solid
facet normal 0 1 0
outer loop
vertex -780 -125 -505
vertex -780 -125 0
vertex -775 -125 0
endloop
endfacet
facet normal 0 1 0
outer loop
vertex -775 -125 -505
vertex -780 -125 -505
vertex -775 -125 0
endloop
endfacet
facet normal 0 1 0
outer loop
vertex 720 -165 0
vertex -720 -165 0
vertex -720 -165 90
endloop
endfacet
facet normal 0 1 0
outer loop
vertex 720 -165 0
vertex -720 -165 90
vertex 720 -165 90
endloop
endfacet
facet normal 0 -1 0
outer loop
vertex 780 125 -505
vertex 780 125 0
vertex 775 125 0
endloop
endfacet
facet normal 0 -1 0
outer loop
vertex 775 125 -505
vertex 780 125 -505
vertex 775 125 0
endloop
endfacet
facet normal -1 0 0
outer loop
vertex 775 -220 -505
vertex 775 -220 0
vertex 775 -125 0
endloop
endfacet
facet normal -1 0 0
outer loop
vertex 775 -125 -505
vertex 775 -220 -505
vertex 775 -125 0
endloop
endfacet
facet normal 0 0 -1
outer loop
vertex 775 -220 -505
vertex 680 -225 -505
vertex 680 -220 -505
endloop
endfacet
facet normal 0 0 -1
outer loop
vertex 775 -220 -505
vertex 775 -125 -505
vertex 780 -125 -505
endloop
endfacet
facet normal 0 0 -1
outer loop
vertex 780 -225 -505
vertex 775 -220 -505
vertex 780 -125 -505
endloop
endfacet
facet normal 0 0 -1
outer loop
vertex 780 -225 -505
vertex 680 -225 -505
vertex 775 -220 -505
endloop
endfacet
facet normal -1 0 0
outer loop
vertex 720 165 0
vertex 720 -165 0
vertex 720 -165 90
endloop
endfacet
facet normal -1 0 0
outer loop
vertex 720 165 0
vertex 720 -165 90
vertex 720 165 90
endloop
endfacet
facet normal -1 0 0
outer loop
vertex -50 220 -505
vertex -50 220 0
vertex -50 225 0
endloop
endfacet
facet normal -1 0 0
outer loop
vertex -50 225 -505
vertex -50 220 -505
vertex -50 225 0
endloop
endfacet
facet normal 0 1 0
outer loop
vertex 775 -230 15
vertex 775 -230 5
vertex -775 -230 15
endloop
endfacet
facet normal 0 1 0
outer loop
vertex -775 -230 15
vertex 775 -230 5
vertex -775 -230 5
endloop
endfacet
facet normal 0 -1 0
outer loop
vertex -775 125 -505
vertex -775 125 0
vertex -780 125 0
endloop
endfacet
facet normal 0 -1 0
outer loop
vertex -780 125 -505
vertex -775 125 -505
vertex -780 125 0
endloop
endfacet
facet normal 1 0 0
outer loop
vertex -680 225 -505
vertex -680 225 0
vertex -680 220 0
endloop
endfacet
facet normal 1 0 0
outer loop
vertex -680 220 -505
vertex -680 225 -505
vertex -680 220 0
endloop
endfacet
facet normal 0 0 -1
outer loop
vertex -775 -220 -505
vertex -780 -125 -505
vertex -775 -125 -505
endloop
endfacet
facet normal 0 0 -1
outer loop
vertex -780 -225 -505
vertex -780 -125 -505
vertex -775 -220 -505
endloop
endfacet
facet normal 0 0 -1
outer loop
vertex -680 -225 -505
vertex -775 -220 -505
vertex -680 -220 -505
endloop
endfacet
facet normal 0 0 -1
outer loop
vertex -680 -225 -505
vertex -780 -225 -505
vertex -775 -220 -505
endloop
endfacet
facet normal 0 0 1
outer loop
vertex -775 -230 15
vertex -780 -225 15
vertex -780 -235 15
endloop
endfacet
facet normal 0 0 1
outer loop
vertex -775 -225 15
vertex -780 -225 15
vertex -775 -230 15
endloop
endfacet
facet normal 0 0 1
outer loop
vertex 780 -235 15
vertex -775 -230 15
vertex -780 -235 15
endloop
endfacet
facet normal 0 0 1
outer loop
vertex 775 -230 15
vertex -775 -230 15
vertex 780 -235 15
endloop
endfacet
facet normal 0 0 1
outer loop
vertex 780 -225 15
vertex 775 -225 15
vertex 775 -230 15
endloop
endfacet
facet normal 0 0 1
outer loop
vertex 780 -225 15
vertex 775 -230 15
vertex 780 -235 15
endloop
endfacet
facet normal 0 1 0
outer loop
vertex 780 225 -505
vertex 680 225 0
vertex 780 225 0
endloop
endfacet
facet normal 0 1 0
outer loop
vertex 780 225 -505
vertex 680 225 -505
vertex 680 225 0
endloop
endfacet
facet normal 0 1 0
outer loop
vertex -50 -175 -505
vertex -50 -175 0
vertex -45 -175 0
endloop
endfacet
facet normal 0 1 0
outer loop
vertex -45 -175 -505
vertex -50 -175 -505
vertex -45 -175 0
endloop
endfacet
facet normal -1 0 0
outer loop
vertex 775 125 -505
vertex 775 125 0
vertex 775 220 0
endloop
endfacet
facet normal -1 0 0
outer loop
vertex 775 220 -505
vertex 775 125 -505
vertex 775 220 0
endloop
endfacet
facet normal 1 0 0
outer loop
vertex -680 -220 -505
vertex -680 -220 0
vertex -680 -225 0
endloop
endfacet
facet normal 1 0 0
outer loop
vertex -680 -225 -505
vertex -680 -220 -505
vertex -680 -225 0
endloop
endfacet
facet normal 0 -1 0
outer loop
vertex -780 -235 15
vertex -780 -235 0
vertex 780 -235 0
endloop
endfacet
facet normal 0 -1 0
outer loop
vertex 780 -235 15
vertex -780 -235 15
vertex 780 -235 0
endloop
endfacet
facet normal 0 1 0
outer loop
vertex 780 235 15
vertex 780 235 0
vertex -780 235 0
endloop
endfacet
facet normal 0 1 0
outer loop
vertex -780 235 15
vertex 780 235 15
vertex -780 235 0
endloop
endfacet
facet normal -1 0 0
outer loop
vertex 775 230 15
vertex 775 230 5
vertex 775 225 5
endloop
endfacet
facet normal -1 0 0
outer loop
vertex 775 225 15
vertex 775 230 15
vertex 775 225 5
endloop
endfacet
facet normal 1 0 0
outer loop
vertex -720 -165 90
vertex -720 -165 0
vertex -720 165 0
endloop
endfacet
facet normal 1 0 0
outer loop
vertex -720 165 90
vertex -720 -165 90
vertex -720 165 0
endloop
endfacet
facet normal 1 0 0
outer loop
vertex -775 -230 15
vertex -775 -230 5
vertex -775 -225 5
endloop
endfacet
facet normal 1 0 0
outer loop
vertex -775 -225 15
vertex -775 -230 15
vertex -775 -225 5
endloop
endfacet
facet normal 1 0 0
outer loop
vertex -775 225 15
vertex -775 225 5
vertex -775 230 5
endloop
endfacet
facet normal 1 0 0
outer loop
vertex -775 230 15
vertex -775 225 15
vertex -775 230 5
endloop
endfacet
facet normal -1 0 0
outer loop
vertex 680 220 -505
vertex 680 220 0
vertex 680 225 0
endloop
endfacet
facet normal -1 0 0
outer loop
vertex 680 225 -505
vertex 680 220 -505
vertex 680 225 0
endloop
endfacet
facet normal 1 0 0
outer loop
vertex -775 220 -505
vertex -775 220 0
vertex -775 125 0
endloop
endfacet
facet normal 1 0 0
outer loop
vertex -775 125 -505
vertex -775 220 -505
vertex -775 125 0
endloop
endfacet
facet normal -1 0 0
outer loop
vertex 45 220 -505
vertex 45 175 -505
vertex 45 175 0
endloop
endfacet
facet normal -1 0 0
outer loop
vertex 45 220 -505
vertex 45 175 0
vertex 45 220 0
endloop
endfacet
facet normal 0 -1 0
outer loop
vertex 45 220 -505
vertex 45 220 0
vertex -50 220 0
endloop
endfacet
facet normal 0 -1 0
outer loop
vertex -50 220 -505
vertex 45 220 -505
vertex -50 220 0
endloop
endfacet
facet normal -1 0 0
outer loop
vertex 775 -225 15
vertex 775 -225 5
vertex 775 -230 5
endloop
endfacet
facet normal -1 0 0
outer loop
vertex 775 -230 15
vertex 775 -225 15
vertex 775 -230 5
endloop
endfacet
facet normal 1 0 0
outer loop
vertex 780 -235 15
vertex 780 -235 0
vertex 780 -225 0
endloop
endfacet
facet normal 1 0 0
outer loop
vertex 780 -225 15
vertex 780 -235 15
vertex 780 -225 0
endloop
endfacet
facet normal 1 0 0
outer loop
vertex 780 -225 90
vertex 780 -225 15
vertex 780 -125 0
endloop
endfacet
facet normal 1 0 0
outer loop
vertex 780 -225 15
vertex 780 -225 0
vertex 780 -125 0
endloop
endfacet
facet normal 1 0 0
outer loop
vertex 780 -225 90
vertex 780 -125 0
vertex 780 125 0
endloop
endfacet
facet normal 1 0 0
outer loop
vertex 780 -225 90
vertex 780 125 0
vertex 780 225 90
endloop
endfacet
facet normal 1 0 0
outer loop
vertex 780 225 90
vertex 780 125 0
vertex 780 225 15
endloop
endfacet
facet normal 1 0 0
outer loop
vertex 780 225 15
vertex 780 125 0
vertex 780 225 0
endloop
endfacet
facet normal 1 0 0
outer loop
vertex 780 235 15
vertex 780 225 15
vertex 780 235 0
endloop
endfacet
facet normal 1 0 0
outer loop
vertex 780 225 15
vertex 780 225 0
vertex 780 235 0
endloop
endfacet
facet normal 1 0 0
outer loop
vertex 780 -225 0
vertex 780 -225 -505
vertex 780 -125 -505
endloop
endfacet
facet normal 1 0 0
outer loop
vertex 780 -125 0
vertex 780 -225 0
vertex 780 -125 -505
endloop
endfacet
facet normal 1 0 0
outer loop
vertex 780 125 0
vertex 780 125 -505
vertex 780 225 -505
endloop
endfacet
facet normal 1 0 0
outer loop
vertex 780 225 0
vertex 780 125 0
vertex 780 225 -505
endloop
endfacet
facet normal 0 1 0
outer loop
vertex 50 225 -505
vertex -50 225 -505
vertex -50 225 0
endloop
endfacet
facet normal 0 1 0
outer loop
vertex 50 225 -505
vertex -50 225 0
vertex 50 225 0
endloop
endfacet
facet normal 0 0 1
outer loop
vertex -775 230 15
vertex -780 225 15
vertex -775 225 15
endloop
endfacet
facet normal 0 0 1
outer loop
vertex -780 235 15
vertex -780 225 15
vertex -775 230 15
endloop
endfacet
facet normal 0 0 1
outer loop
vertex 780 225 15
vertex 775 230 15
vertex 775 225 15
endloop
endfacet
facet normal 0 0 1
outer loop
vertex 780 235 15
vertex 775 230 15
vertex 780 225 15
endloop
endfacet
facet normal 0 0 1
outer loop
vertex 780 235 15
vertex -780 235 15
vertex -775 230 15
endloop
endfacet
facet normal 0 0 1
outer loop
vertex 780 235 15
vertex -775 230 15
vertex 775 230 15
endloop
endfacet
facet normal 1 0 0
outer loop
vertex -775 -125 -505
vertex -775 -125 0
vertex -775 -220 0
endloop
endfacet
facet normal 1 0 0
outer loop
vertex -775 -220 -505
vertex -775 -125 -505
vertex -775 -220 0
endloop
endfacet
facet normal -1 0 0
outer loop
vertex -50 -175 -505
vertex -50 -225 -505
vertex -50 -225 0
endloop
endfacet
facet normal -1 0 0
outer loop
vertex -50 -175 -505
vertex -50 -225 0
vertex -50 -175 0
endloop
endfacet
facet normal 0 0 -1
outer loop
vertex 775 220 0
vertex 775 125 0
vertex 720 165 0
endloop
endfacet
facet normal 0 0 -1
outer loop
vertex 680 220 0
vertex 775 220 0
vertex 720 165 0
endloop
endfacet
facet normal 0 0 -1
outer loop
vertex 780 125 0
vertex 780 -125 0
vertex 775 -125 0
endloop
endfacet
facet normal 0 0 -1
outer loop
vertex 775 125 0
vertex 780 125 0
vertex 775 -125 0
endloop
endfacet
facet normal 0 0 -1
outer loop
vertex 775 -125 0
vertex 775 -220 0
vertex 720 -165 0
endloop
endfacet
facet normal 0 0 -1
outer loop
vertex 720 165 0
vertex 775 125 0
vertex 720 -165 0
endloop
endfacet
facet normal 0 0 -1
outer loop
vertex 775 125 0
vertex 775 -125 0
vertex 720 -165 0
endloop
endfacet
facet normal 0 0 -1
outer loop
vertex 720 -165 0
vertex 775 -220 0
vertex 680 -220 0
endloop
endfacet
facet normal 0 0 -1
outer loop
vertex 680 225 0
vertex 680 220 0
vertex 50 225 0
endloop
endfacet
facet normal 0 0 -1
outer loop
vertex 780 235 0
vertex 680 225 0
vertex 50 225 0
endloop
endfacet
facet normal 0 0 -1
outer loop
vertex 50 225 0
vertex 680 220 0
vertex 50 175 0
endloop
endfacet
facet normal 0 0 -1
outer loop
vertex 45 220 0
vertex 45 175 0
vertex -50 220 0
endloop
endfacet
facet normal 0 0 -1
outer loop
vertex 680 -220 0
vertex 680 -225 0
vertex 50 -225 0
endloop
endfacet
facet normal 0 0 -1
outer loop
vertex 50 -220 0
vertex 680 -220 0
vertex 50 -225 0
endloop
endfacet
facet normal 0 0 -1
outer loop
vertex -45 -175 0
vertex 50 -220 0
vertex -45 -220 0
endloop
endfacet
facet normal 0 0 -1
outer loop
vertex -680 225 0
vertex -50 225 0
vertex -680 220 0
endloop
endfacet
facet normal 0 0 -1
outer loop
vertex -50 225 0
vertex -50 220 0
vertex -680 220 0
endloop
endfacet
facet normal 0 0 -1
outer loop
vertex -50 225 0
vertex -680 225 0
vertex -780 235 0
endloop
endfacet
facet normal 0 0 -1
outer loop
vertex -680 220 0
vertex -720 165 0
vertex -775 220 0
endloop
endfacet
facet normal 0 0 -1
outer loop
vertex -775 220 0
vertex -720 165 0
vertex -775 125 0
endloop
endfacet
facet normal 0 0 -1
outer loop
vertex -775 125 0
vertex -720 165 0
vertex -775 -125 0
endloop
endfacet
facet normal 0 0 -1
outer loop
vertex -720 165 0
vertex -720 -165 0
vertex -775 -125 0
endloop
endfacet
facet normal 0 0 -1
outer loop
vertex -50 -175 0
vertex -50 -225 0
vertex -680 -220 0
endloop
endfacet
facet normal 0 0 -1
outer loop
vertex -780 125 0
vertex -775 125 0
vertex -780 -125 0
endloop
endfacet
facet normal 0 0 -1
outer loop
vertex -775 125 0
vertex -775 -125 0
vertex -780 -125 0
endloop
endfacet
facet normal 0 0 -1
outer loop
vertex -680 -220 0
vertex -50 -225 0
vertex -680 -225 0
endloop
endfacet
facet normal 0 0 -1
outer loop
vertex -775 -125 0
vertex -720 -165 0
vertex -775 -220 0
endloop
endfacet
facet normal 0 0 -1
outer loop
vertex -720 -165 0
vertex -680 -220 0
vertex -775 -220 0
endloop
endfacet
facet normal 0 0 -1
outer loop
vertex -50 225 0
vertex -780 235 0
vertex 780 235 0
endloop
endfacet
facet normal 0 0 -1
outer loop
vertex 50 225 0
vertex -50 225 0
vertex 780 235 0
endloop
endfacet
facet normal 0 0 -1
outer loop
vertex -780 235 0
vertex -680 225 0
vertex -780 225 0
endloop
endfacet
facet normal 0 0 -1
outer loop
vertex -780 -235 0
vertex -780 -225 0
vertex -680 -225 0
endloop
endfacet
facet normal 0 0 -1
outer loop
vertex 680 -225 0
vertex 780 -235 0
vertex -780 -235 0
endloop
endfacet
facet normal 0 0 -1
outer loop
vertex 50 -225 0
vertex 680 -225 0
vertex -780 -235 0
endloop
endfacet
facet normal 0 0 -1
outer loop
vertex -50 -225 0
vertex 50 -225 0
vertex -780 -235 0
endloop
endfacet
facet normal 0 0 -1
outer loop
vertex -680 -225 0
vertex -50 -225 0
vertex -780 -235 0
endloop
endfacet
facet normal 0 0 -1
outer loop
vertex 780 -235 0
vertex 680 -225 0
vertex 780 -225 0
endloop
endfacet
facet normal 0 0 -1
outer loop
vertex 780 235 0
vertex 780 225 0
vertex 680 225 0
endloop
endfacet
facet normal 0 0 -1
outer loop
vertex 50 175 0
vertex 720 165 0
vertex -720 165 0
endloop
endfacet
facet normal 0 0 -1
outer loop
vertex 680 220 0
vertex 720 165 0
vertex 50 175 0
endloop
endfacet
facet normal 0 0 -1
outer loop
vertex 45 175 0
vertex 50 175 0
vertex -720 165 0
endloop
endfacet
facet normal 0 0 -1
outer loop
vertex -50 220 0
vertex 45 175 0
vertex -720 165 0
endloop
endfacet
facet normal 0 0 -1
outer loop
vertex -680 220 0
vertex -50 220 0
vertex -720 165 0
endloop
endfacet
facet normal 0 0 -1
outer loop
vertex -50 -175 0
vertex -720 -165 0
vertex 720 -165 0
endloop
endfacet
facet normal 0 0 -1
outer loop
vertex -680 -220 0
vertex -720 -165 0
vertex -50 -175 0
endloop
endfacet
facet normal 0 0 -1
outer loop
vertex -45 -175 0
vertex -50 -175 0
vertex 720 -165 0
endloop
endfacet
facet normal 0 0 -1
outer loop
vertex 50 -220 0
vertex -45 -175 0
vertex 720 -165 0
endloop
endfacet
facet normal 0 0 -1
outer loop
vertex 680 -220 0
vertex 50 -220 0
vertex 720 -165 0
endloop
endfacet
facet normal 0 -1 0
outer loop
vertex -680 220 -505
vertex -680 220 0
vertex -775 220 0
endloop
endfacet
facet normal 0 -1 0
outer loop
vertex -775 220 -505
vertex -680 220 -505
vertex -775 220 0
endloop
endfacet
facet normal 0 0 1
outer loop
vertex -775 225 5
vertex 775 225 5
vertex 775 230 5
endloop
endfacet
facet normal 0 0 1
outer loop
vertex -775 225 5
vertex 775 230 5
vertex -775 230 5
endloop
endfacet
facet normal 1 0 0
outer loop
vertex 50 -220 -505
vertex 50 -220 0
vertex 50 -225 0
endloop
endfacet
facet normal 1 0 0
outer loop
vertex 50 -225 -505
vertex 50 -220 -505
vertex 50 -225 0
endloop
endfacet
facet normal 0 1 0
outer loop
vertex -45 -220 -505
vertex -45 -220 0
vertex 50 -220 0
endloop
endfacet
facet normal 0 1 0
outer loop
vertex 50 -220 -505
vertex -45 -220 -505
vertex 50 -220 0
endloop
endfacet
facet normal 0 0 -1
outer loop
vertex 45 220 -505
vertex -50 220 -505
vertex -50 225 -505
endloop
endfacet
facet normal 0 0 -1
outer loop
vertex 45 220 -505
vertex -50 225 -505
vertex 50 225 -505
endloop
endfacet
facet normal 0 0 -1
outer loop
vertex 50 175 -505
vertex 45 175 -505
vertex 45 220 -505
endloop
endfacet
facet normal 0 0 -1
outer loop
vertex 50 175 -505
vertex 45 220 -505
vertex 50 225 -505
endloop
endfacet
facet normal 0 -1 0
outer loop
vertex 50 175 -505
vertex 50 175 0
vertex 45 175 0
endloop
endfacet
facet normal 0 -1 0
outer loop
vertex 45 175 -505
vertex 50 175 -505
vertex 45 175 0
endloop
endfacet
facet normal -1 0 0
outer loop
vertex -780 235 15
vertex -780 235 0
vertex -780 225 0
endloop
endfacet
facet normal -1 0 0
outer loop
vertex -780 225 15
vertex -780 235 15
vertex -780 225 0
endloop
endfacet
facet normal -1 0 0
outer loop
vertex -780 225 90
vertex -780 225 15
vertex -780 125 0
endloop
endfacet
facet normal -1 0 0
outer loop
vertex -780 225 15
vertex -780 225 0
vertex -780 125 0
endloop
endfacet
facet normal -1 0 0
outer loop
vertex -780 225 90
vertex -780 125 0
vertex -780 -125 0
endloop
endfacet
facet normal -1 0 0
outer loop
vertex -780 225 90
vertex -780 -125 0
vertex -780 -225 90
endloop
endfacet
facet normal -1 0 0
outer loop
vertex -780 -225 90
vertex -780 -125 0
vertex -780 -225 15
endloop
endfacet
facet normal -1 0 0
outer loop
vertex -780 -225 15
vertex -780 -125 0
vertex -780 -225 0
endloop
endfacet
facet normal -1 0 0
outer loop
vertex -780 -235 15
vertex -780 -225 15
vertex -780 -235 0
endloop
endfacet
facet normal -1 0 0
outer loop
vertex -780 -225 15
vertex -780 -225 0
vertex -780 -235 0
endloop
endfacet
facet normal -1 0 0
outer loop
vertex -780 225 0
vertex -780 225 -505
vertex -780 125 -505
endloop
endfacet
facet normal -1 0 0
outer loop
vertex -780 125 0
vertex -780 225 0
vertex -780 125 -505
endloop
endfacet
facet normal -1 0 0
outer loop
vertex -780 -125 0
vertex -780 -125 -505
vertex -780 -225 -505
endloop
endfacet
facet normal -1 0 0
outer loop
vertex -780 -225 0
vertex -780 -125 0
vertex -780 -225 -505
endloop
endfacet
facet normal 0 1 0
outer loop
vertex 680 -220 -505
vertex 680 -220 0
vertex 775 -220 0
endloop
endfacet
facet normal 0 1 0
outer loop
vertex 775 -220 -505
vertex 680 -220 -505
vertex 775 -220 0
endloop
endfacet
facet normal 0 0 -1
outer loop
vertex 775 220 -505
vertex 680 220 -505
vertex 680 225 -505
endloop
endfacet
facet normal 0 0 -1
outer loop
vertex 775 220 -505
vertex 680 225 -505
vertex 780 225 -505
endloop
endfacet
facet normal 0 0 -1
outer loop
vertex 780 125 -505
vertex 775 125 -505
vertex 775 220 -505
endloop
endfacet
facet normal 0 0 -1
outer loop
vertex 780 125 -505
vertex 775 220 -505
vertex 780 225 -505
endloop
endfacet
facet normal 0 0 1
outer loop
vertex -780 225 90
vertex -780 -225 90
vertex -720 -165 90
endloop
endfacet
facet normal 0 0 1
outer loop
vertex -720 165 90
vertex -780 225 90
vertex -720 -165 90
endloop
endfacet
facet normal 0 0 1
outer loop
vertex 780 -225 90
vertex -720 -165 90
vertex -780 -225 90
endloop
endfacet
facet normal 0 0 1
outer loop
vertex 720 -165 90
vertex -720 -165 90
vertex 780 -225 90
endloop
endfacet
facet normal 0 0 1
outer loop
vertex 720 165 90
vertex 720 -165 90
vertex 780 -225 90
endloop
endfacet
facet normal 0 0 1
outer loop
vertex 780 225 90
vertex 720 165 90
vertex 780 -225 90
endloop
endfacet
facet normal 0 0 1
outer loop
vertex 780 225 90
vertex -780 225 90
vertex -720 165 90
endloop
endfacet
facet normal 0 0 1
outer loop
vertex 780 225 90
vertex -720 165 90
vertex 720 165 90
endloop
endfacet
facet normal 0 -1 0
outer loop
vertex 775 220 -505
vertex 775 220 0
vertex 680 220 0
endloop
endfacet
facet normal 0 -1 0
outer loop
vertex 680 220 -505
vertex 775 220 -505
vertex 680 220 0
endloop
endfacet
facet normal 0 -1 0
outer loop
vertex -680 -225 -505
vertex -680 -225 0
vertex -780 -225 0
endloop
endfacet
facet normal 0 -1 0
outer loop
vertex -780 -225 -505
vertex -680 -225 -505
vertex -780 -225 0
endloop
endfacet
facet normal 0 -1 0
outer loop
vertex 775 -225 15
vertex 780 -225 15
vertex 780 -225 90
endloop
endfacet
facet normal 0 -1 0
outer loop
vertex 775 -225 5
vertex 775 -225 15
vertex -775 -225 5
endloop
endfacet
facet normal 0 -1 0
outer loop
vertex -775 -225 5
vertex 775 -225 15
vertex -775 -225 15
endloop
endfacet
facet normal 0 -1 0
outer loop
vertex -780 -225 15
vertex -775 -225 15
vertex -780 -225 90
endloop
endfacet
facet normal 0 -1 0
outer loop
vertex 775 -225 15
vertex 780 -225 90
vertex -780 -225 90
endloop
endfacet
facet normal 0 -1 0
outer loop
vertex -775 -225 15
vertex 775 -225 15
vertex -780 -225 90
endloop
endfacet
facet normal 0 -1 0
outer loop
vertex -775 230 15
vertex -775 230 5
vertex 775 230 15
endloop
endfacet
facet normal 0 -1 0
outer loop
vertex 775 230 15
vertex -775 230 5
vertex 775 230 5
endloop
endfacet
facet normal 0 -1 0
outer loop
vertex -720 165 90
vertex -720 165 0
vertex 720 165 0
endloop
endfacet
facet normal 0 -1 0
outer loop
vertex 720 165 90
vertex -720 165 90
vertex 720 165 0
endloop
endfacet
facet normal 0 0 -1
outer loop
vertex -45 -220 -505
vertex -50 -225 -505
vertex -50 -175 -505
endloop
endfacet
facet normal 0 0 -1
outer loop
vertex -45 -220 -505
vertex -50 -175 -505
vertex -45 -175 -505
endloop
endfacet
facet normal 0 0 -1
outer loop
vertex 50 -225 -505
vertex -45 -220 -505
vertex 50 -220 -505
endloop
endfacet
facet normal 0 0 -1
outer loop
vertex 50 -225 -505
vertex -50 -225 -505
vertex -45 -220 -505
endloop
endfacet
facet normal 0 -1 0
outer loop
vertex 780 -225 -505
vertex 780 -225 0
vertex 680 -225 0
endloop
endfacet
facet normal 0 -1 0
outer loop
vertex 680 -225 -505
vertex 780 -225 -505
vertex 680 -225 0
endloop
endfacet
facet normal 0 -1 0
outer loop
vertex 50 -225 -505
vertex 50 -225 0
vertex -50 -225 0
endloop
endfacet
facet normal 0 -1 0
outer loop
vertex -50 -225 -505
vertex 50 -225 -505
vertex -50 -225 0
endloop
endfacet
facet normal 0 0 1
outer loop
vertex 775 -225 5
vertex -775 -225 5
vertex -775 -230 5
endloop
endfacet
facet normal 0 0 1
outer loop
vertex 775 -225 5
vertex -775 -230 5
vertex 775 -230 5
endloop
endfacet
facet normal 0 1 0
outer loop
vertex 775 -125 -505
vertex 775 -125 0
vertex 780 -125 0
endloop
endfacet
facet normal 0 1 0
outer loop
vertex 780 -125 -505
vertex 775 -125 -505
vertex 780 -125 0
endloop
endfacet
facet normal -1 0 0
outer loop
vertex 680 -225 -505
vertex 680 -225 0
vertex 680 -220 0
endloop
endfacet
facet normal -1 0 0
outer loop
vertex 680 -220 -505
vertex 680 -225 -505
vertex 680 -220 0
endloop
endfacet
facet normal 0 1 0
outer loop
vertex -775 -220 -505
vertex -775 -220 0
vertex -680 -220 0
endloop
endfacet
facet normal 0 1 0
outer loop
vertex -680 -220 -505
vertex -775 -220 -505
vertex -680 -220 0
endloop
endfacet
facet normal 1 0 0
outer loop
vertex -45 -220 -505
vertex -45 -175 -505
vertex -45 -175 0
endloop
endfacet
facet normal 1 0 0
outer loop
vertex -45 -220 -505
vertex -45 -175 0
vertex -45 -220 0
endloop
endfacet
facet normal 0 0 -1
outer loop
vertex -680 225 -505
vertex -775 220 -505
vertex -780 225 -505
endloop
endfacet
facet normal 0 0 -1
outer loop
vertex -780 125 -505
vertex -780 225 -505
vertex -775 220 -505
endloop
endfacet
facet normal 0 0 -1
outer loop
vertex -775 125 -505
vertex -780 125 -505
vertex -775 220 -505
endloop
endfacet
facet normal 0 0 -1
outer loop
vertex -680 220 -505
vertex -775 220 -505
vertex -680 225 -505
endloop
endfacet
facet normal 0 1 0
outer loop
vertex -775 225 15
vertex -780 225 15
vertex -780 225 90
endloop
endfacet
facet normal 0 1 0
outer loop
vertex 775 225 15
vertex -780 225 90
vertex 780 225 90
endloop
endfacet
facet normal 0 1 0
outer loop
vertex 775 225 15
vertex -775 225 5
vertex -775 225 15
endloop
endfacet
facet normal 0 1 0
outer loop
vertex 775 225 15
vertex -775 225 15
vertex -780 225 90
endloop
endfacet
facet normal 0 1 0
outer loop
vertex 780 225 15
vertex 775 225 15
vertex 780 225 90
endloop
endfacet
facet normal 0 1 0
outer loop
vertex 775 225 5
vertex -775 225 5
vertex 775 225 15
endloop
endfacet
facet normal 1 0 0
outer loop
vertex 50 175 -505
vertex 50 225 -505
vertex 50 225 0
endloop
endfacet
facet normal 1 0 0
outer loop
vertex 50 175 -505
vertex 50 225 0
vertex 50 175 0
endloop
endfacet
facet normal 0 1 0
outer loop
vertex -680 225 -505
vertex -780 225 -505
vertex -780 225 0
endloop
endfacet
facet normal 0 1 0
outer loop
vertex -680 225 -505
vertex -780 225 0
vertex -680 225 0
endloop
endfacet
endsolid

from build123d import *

# Parameters (mm, degrees)
F0_W      = 1560
F0_H      = 450
F0_W_2    = 1440
F0_H_2    = 330
F1_DEPTH  = 90
F3_DEPTH  = 505
F4_W      = 1560
F4_H      = 5
F6_DEPTH  = 10
F5_W      = 1560
F5_H      = 5
F7_DEPTH  = 10
F9_DEPTH  = 10
F11_DEPTH = 10


with BuildPart() as f1:
    # F0 (on Top) → F1 (new body)
    with BuildSketch(Plane.XY):
        Rectangle(F0_W, F0_H)
        Rectangle(F0_W_2, F0_H_2, mode=Mode.SUBTRACT)
    extrude(amount=F1_DEPTH)

    # F2 (on face) → F3 (join)
    with BuildSketch(Plane(origin=(0, 0, 0), x_dir=(1, 0, 0), z_dir=(0, 0, -1))):
        Polygon((-780, 225), (-780, 125), (-775, 125), (-775, 220), (-680, 220), (-680, 225), align=None)
        Polygon((-775, -125), (-780, -125), (-780, -225), (-680, -225), (-680, -220), (-775, -220), align=None)
        Polygon((50, 225), (-50, 225), (-50, 175), (-45, 175), (-45, 220), (50, 220), align=None)
        Polygon((-50, -220), (-50, -225), (50, -225), (50, -175), (45, -175), (45, -220), align=None)
        Polygon((780, 225), (680, 225), (680, 220), (775, 220), (775, 125), (780, 125), align=None)
        Polygon((680, -220), (680, -225), (780, -225), (780, -125), (775, -125), (775, -220), align=None)
    extrude(amount=F3_DEPTH)

    # F4 (on face) → F6 (join)
    with BuildSketch(Plane.XZ.offset(225)):
        with Locations((0, 2.5)):
            Rectangle(F4_W, F4_H)
    extrude(amount=F6_DEPTH)

    # F5 (on face) → F7 (join)
    with BuildSketch(Plane(origin=(0, 225, 0), x_dir=(-1, 0, 0), z_dir=(0, 1, 0))):
        with Locations((0, 2.5)):
            Rectangle(F5_W, F5_H)
    extrude(amount=F7_DEPTH)

    # F8 (on face) → F9 (join)
    with BuildSketch(Plane.XY.offset(5)):
        Polygon((-780, -230), (-780, -235), (-775, -235), (775, -235), (780, -235), (780, -230), (780, -225), (775, -225), (775, -230), (-775, -230), (-775, -225), (-780, -225), align=None)
    extrude(amount=F9_DEPTH)

    # F10 (on face) → F11 (join)
    with BuildSketch(Plane.XY.offset(5)):
        Polygon((-780, 235), (-780, 225), (-775, 225), (-775, 230), (775, 230), (775, 225), (780, 225), (780, 230), (780, 235), (-775, 235), align=None)
    extrude(amount=F11_DEPTH)


solid = f1.part
